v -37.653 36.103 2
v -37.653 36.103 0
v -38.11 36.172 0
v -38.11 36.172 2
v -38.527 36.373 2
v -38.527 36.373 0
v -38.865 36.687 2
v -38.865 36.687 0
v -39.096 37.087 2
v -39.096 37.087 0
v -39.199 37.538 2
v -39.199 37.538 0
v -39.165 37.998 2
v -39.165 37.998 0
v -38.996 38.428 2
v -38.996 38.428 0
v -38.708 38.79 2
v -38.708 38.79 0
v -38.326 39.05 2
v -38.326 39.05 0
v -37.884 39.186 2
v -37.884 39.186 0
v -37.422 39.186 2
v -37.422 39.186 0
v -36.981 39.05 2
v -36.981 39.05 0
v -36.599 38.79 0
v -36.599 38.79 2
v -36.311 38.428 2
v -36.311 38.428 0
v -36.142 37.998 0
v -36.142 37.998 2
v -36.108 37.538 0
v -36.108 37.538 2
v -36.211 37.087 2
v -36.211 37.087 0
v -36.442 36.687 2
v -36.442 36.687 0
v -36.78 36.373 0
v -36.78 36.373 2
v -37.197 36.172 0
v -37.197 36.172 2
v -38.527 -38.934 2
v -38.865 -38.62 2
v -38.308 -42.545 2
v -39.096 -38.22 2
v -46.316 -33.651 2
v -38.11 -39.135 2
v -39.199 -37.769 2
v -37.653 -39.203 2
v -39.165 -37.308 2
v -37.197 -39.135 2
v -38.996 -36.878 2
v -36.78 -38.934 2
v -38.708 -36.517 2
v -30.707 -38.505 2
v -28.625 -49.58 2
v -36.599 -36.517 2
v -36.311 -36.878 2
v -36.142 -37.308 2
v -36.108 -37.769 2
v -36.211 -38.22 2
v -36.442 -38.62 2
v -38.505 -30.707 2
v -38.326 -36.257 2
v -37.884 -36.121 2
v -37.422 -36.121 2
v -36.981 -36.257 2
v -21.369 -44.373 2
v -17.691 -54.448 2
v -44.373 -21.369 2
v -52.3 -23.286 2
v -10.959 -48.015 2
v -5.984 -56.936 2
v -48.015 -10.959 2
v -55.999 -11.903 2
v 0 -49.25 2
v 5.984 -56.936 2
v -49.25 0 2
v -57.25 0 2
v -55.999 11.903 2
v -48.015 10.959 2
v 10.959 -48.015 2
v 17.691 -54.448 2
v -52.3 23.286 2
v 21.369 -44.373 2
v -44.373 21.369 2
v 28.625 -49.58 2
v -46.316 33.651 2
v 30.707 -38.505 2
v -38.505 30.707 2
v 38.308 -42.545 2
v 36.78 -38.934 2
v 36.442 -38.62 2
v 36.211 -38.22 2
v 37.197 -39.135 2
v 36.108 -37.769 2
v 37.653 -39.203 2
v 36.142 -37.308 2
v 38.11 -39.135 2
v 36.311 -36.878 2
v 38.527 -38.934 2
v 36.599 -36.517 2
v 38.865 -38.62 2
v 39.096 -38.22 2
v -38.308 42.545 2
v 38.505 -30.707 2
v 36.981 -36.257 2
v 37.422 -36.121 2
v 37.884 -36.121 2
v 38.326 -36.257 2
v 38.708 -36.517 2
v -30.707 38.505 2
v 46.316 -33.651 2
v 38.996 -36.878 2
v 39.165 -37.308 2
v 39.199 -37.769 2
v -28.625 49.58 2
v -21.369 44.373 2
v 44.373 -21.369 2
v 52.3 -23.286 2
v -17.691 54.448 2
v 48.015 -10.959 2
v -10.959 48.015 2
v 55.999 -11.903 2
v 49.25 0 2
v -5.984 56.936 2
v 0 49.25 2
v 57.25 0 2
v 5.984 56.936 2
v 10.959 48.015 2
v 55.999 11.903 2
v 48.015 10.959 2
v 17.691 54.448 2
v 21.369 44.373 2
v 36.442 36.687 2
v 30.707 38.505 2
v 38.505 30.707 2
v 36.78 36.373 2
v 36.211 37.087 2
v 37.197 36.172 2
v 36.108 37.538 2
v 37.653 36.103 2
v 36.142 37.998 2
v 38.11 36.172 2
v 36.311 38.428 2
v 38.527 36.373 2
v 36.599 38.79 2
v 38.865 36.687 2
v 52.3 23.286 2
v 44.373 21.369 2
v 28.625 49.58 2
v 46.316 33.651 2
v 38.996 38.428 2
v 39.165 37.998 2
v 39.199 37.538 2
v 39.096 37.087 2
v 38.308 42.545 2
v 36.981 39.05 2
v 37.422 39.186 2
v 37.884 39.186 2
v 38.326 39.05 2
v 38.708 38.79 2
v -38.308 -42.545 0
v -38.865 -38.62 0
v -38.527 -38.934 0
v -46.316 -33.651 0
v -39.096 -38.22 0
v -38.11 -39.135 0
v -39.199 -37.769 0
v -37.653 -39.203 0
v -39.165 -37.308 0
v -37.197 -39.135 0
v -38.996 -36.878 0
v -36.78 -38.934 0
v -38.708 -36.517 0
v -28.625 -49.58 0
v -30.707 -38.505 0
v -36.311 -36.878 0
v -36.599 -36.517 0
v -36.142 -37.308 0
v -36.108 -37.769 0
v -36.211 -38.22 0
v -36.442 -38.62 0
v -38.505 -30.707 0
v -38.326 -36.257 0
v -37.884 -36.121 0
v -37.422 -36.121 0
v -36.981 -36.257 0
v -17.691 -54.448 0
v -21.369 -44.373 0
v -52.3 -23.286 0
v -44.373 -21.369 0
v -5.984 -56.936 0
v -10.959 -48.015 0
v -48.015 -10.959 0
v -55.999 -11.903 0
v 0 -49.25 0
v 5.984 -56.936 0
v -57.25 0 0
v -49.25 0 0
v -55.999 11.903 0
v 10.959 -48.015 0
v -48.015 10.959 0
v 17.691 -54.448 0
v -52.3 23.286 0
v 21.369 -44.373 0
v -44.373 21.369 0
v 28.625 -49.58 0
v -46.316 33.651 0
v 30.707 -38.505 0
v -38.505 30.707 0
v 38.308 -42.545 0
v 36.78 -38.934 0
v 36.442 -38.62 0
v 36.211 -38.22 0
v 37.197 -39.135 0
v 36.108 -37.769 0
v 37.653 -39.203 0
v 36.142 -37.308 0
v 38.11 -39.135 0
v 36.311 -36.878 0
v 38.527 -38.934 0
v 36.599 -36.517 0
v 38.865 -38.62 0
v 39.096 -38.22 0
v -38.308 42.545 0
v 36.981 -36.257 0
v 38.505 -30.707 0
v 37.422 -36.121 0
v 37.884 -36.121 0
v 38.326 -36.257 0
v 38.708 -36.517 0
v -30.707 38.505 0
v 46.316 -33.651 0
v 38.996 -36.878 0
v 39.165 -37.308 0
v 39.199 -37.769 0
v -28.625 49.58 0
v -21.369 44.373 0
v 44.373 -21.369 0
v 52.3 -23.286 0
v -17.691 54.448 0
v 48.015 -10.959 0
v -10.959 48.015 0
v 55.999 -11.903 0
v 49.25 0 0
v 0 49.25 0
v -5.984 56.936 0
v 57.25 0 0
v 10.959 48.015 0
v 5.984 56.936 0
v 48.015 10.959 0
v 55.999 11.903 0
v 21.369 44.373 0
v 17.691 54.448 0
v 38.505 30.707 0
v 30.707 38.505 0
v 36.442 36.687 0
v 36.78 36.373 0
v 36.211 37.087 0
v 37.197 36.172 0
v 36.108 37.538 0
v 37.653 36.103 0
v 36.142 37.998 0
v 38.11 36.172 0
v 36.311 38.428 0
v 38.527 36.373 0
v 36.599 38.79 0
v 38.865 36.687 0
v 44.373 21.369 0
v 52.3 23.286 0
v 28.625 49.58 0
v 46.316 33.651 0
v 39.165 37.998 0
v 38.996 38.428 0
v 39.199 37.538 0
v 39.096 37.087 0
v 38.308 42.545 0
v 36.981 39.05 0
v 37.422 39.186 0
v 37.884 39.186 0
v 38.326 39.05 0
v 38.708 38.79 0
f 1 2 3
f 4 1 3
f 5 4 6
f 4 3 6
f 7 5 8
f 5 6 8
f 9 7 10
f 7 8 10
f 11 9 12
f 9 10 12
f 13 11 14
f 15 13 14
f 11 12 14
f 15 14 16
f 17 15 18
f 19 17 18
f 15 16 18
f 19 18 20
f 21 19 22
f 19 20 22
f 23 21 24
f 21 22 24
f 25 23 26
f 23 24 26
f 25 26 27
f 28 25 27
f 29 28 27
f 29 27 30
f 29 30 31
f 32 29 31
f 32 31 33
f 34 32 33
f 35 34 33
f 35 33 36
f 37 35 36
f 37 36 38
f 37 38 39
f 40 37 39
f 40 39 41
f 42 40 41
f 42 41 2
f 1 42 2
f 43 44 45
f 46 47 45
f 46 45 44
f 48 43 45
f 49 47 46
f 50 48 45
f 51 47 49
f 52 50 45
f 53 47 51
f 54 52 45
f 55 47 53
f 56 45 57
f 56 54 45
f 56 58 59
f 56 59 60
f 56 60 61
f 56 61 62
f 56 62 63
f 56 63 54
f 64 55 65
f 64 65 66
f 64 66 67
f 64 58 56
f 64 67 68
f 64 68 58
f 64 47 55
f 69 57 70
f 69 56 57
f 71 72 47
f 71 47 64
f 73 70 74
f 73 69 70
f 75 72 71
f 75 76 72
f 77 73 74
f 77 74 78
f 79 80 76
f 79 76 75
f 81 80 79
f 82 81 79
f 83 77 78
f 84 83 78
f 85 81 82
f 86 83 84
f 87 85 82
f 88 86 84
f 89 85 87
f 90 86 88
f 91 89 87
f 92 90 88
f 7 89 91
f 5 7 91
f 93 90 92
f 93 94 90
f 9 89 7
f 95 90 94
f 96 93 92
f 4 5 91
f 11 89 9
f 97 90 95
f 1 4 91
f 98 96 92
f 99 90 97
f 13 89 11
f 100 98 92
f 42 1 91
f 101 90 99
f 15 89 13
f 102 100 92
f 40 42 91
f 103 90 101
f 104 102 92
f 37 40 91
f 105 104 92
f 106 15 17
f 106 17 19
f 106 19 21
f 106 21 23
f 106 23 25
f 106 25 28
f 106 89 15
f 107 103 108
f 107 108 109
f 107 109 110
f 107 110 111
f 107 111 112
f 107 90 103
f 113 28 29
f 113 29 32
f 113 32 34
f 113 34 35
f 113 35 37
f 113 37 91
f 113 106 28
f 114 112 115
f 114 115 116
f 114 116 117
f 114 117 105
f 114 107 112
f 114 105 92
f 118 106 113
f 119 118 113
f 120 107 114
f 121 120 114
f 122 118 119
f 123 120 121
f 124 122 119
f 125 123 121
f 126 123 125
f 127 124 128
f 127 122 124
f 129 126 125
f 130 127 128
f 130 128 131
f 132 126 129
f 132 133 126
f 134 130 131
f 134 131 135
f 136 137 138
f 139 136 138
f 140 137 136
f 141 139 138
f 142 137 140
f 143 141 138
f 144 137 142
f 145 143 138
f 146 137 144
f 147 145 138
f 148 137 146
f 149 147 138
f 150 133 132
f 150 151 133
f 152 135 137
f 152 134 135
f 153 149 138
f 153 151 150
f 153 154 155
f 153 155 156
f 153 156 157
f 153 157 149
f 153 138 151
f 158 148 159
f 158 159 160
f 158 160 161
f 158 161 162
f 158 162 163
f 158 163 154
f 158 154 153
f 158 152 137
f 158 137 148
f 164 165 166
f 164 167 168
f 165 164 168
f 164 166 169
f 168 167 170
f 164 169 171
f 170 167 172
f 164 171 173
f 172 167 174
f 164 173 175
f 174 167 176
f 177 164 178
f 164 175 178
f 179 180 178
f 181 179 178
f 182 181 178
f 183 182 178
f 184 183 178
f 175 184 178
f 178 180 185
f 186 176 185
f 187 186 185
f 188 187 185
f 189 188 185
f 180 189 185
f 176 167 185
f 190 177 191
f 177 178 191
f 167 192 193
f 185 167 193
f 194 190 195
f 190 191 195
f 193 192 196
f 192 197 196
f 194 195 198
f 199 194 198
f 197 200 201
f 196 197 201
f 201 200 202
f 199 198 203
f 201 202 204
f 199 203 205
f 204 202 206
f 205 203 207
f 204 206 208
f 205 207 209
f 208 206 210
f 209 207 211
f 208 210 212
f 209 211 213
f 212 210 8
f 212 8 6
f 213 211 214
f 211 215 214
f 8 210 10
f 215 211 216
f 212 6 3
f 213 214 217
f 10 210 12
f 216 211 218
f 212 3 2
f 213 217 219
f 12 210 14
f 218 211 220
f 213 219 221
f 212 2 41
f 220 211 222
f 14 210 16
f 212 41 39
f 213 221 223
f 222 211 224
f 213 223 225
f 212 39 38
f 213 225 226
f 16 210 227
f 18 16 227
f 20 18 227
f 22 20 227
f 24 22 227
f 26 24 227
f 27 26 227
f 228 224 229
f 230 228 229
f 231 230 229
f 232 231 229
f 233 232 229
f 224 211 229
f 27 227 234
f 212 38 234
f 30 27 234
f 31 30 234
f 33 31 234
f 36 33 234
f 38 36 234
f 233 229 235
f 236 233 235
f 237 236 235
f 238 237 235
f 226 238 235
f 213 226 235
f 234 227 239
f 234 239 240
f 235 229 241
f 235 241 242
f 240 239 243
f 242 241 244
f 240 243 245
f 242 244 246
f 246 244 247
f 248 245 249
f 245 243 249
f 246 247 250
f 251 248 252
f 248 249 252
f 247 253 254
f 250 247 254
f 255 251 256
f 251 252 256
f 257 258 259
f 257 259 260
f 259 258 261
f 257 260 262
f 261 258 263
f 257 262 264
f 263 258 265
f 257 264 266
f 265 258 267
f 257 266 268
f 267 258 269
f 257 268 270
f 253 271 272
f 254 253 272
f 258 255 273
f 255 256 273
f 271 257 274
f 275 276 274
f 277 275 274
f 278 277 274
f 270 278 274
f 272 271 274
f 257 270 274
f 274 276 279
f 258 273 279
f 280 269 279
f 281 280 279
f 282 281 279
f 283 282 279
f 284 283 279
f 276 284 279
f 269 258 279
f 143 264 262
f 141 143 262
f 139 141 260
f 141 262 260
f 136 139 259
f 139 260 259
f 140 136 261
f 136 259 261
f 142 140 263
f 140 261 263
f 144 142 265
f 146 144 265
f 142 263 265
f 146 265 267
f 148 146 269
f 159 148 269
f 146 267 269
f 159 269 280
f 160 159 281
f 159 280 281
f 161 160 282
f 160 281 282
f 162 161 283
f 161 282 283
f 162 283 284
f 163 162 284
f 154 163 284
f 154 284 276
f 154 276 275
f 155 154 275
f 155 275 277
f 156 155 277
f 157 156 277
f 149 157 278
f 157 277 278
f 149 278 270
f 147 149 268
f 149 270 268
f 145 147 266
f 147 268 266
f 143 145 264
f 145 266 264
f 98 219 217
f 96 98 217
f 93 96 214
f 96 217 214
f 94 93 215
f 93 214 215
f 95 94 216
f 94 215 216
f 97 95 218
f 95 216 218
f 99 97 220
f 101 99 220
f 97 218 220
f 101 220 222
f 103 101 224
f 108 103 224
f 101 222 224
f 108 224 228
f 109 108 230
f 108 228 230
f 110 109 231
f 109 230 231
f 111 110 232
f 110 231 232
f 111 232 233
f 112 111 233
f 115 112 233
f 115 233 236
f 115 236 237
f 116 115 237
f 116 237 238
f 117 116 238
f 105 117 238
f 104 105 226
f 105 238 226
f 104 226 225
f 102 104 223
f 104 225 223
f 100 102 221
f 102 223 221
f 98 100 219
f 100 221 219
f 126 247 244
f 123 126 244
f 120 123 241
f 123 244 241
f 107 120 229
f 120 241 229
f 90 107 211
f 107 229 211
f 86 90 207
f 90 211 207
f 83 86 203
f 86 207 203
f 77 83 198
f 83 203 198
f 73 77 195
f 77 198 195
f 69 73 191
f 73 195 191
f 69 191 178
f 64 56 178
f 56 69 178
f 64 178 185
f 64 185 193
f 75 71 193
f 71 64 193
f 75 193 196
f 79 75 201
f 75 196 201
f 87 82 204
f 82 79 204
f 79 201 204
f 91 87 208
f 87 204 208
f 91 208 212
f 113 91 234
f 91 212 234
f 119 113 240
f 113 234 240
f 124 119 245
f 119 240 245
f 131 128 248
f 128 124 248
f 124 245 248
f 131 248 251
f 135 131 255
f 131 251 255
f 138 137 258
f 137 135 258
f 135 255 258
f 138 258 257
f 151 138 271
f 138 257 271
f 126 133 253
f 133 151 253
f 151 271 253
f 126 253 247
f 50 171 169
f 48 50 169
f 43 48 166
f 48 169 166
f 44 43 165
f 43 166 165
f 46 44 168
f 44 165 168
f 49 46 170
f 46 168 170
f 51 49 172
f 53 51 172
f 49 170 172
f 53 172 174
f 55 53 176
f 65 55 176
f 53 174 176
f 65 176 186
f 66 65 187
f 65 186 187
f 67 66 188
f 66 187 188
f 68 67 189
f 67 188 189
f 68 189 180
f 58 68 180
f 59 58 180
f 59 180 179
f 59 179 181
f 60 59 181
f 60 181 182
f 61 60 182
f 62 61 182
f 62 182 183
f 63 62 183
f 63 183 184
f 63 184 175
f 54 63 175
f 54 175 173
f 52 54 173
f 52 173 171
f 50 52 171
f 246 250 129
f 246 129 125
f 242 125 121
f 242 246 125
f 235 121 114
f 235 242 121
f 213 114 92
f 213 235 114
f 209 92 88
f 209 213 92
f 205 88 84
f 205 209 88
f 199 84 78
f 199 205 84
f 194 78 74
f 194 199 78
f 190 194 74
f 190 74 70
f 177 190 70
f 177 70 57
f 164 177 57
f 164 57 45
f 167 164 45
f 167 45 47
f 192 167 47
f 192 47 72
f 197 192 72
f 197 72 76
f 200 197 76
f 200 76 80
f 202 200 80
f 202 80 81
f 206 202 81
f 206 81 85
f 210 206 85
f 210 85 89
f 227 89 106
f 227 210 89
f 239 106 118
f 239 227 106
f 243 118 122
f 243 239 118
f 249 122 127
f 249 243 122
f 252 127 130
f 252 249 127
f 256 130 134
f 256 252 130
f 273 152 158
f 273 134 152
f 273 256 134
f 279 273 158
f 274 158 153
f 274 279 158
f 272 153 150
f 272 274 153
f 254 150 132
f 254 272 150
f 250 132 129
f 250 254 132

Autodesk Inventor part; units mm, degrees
ref_plane "YZ Plane" through (0, 0, 0) normal (1, 0, 0) x (0, 1, 0)
ref_plane "XZ Plane" through (0, 0, 0) normal (0, 1, 0) x (-1, 0, 0)
ref_plane "XY Plane" through (0, 0, 0) normal (0, 0, 1) x (1, 0, 0)
sketch "スケッチ1" plane through (0, 0, 0) normal (0, 0, 1) x (1, 0, 0)
  circle A0 centre (0, 0) radius 42.25
  circle A1 centre (0, 0) radius 53.25
  circle A2 centre (0, 0) radius 49.25
  circle A3 centre (0, 0) radius 57.25
  dimension "d0" = 84.5
  dimension "d1" = 11
  dimension "d2" = 4
  dimension "d3" = 4
extrude "押し出し1" add sketch "スケッチ1" along normal blind 2 contours A1 | A3
sketch "スケッチ2" plane through (0, 0, 2) normal (0, 0, 1) x (1, 0, 0)
  line L0 (0, 0) -> (0, 57.25)
  circle A0 centre (0, 0) radius 57.25 projected
  line L1 (0, 0) -> (40.4819, 40.4819)
  circle A1 centre (0, 0) radius 53.25
  circle A2 centre (0, 0) radius 49.25 projected
  point P0 (37.6534, 37.6534)
  point P1 (-37.6534, 37.6534)
  point P2 (-37.6534, -37.6534)
  point P3 (37.6534, -37.6534)
  dimension "d6" = 45
  dimension "d7" = 4
  dimension "d10" = 360
hole "穴1" at (37.6534, 37.6534, 2) at (-37.6534, 37.6534, 2) at (-37.6534, -37.6534, 2) at (37.6534, -37.6534, 2) direction (0, 0, -1) diameter 3.1 end through all
properties part number "base_plate4" material "アルミニウム 6061"
